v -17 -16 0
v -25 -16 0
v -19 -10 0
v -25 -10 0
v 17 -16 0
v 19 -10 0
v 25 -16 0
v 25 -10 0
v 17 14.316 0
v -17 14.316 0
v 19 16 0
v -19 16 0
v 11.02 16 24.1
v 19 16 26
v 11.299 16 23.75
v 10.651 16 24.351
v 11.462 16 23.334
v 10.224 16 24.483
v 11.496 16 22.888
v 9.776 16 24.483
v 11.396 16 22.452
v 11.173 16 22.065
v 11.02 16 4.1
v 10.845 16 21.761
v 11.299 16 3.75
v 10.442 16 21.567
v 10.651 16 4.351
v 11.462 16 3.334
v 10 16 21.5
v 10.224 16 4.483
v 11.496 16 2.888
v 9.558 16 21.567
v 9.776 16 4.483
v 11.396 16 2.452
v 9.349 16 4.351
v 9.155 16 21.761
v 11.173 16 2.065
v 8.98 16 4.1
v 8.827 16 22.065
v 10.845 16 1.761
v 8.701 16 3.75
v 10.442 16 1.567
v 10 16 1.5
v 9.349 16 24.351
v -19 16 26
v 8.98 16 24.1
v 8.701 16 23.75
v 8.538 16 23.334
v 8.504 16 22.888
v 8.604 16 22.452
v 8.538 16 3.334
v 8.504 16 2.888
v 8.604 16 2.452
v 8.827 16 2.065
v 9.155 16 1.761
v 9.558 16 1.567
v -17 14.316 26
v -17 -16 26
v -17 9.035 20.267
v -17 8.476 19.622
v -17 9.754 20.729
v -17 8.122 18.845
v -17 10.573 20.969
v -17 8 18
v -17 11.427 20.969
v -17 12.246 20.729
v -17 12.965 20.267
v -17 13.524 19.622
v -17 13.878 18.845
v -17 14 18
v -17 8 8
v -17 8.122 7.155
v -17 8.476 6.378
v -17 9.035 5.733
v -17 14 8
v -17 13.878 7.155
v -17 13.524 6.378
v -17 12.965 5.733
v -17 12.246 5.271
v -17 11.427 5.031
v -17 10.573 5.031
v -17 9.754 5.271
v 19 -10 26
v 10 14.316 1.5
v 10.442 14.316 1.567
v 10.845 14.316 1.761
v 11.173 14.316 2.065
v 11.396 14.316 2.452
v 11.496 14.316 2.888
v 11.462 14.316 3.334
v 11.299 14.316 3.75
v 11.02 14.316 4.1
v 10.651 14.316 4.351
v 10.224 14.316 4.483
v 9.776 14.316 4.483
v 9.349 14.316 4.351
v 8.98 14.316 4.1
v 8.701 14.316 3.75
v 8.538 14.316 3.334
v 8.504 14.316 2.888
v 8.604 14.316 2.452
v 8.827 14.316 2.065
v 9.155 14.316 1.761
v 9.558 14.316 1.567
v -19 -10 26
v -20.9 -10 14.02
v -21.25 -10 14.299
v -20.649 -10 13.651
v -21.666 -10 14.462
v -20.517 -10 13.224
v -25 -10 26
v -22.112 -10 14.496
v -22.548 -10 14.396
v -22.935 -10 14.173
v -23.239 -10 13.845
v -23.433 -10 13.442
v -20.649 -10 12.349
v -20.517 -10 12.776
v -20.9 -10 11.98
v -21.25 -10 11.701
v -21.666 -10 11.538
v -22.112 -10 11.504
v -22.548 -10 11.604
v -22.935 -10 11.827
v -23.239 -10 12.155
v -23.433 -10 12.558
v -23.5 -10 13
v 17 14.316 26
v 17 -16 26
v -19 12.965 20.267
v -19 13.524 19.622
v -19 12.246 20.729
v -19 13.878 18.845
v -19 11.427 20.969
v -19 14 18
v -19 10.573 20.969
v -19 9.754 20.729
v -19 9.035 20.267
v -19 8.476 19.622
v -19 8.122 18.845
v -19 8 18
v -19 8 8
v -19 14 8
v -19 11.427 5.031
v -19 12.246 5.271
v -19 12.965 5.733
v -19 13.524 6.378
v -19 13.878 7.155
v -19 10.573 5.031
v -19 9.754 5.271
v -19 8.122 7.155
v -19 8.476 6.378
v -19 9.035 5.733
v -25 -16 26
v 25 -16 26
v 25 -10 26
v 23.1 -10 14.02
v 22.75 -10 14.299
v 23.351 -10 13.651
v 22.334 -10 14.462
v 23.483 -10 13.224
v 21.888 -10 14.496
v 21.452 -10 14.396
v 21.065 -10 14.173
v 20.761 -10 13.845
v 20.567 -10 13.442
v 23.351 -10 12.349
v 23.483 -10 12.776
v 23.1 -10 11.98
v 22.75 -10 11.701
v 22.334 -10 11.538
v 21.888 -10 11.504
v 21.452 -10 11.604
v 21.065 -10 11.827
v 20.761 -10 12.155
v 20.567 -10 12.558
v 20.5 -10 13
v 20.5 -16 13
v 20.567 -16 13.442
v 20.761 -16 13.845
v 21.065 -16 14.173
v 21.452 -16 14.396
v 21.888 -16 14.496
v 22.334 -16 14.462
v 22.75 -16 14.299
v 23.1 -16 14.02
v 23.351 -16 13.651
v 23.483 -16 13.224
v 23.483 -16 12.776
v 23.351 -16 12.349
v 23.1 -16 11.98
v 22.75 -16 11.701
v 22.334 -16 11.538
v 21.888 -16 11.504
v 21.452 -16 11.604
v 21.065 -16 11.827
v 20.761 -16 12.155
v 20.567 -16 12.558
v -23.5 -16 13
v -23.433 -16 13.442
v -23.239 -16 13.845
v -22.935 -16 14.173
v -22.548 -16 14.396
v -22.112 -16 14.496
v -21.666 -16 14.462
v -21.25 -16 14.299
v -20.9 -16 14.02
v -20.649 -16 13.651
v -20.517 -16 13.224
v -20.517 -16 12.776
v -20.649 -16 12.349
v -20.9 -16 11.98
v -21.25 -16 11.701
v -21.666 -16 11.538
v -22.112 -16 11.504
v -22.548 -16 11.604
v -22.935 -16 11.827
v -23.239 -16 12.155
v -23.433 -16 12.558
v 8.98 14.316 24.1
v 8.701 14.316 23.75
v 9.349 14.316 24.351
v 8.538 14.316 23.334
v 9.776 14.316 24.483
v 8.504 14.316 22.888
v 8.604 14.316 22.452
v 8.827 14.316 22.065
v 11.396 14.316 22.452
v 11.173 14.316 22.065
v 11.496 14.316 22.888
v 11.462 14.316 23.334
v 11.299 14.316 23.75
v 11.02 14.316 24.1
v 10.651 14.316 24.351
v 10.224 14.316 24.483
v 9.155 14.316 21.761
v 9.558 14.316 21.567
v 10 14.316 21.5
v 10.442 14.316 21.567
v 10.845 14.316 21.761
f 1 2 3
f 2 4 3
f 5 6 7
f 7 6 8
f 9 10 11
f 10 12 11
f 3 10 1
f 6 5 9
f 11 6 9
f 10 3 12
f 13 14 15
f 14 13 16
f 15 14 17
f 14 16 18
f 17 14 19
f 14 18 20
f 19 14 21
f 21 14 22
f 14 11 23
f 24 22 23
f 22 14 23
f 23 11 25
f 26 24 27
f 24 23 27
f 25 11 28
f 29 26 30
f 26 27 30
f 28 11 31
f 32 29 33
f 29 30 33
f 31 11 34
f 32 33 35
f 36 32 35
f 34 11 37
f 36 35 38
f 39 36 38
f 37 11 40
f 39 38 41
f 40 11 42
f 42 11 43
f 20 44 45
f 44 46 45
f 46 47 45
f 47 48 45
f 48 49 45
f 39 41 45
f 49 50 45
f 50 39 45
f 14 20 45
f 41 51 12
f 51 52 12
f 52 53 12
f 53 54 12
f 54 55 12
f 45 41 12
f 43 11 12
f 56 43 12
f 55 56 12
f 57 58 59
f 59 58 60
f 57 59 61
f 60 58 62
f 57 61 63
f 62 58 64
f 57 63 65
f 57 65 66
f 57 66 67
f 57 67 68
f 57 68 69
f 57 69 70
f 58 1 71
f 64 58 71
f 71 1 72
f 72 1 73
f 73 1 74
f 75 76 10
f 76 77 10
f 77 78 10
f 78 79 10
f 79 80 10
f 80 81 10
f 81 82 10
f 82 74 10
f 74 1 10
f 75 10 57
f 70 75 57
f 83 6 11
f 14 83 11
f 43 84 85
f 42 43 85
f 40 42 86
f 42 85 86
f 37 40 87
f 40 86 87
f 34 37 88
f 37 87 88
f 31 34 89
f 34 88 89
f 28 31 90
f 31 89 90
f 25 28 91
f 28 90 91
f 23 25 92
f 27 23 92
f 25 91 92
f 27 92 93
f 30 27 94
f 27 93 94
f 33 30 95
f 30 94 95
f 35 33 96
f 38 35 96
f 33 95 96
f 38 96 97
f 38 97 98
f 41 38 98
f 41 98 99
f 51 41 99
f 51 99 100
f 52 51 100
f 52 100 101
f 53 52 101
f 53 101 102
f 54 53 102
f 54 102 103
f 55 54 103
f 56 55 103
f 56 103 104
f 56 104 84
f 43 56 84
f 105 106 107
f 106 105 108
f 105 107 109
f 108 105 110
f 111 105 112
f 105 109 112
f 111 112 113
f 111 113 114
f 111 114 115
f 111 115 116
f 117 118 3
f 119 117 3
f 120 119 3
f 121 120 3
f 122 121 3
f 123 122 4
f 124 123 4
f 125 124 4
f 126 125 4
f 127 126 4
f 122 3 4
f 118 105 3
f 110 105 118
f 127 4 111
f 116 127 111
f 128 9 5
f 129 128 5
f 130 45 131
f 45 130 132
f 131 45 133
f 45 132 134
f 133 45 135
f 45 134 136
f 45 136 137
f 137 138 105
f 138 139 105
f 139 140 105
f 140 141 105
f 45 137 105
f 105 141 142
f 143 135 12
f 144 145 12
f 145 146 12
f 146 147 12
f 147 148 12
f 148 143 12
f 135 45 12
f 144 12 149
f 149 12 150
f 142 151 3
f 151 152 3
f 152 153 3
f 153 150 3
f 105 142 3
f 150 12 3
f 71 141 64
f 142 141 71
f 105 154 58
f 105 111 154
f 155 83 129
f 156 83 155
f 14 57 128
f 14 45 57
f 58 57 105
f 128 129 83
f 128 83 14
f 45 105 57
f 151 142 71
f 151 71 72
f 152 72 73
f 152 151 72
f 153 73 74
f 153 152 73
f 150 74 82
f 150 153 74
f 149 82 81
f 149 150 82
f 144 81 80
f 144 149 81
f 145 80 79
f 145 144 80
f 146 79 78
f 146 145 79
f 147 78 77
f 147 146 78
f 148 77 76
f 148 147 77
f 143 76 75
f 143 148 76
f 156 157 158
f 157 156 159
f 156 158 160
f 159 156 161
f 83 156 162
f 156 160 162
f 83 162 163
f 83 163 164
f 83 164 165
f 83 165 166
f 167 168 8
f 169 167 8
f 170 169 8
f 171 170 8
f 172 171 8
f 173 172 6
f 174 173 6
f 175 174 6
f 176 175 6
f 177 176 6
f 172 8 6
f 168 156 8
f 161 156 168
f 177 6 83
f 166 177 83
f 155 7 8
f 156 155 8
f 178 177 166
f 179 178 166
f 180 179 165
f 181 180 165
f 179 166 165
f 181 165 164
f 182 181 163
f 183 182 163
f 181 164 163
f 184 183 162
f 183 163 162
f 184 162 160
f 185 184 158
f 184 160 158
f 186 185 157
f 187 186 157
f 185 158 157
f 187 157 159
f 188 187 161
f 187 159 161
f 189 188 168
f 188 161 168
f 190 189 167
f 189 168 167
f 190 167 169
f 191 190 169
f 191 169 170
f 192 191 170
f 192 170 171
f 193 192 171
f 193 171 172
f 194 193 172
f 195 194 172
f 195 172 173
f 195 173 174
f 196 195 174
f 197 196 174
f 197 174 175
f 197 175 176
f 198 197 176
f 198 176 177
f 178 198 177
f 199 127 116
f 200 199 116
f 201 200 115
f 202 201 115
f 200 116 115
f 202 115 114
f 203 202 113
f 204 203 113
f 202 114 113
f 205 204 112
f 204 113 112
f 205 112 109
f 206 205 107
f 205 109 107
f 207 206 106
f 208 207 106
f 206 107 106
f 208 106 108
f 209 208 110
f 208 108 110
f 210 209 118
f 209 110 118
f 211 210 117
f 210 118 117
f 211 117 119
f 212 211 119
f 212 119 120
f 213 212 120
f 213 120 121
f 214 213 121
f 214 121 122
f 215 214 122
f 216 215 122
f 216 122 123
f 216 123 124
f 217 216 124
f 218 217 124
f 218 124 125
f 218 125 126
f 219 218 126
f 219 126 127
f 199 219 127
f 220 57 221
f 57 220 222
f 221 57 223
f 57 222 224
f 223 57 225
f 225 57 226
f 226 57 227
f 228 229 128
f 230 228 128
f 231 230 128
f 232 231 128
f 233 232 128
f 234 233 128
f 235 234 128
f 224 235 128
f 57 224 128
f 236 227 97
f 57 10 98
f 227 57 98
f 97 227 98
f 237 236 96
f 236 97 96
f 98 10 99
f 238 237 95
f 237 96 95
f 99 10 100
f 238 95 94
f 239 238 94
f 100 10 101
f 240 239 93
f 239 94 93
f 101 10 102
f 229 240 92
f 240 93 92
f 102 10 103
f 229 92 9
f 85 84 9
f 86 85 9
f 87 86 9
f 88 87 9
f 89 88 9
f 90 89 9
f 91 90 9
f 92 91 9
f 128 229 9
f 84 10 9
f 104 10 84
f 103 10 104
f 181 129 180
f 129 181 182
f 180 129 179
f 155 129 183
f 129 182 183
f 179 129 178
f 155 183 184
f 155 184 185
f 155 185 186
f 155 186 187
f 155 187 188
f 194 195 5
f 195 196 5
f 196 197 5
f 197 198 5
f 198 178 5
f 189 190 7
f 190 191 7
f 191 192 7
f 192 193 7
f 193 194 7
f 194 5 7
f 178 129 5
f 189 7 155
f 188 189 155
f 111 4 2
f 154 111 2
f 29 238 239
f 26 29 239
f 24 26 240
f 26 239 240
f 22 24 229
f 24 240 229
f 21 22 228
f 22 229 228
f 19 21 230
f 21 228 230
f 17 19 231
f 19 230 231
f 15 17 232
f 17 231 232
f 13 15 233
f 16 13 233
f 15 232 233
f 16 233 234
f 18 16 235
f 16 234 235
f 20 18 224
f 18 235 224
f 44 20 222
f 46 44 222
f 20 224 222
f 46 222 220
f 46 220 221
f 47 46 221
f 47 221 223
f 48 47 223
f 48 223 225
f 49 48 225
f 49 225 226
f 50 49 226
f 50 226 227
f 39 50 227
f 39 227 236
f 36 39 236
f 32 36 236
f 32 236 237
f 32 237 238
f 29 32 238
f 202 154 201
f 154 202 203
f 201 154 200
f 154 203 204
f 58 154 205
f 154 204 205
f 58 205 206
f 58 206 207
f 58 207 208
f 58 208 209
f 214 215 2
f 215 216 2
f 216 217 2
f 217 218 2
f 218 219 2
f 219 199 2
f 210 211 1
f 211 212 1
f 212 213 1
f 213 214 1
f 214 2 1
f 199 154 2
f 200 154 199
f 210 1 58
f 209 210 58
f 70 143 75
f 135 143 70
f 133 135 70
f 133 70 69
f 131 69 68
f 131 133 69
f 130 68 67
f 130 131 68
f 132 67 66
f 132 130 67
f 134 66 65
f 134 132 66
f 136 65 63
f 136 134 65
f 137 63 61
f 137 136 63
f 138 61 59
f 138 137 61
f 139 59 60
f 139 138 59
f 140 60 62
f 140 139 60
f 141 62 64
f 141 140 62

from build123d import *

# Parameters (mm, degrees)
BOSS_EXTRUDE1_DEPTH = 26
SKETCH2_R           = 1.5
CUT_EXTRUDE1_DEPTH  = 48.117375685
SKETCH3_R           = 1.5
CUT_EXTRUDE2_DEPTH  = 45.463468151
CUT_EXTRUDE3_DEPTH  = 10


with BuildPart() as part:
    # Sketch1 → Boss-Extrude1 (new body)
    with BuildSketch(Plane.XY):
        Polygon((-25, -16), (-17, -16), (-17, 14.315789474), (17, 14.315789474), (17, -16), (25, -16), (25, -10), (19, -10), (19, 16), (-19, 16), (-19, -10), (-25, -10), align=None)
    extrude(amount=BOSS_EXTRUDE1_DEPTH)

    # Sketch2 → Cut-Extrude1 (cut, through all)
    with BuildSketch(Plane.XZ.offset(-14.315789474)):
        with Locations((10, 23)):
            Circle(SKETCH2_R)
        with Locations((10, 3)):
            Circle(SKETCH2_R)
    extrude(amount=-CUT_EXTRUDE1_DEPTH, mode=Mode.SUBTRACT)

    # Sketch3 → Cut-Extrude2 (cut, through all)
    with BuildSketch(Plane(origin=(0, -10, 0), x_dir=(1, 0, 0), z_dir=(0, 1, 0))):
        with Locations((22, -13)):
            Circle(SKETCH3_R)
        with Locations((-22, -13)):
            Circle(SKETCH3_R)
    extrude(amount=-CUT_EXTRUDE2_DEPTH, mode=Mode.SUBTRACT)

    # Sketch4 → Cut-Extrude3 (cut)
    with BuildSketch(Plane.ZY.offset(19)):
        with BuildLine():
            Line((18, 14), (8, 14))
            ThreePointArc((8, 14), (5, 11), (8, 8))
            Line((8, 8), (18, 8))
            ThreePointArc((18, 8), (21, 11), (18, 14))
        make_face()
    extrude(amount=-CUT_EXTRUDE3_DEPTH, mode=Mode.SUBTRACT)


solid = part.part
